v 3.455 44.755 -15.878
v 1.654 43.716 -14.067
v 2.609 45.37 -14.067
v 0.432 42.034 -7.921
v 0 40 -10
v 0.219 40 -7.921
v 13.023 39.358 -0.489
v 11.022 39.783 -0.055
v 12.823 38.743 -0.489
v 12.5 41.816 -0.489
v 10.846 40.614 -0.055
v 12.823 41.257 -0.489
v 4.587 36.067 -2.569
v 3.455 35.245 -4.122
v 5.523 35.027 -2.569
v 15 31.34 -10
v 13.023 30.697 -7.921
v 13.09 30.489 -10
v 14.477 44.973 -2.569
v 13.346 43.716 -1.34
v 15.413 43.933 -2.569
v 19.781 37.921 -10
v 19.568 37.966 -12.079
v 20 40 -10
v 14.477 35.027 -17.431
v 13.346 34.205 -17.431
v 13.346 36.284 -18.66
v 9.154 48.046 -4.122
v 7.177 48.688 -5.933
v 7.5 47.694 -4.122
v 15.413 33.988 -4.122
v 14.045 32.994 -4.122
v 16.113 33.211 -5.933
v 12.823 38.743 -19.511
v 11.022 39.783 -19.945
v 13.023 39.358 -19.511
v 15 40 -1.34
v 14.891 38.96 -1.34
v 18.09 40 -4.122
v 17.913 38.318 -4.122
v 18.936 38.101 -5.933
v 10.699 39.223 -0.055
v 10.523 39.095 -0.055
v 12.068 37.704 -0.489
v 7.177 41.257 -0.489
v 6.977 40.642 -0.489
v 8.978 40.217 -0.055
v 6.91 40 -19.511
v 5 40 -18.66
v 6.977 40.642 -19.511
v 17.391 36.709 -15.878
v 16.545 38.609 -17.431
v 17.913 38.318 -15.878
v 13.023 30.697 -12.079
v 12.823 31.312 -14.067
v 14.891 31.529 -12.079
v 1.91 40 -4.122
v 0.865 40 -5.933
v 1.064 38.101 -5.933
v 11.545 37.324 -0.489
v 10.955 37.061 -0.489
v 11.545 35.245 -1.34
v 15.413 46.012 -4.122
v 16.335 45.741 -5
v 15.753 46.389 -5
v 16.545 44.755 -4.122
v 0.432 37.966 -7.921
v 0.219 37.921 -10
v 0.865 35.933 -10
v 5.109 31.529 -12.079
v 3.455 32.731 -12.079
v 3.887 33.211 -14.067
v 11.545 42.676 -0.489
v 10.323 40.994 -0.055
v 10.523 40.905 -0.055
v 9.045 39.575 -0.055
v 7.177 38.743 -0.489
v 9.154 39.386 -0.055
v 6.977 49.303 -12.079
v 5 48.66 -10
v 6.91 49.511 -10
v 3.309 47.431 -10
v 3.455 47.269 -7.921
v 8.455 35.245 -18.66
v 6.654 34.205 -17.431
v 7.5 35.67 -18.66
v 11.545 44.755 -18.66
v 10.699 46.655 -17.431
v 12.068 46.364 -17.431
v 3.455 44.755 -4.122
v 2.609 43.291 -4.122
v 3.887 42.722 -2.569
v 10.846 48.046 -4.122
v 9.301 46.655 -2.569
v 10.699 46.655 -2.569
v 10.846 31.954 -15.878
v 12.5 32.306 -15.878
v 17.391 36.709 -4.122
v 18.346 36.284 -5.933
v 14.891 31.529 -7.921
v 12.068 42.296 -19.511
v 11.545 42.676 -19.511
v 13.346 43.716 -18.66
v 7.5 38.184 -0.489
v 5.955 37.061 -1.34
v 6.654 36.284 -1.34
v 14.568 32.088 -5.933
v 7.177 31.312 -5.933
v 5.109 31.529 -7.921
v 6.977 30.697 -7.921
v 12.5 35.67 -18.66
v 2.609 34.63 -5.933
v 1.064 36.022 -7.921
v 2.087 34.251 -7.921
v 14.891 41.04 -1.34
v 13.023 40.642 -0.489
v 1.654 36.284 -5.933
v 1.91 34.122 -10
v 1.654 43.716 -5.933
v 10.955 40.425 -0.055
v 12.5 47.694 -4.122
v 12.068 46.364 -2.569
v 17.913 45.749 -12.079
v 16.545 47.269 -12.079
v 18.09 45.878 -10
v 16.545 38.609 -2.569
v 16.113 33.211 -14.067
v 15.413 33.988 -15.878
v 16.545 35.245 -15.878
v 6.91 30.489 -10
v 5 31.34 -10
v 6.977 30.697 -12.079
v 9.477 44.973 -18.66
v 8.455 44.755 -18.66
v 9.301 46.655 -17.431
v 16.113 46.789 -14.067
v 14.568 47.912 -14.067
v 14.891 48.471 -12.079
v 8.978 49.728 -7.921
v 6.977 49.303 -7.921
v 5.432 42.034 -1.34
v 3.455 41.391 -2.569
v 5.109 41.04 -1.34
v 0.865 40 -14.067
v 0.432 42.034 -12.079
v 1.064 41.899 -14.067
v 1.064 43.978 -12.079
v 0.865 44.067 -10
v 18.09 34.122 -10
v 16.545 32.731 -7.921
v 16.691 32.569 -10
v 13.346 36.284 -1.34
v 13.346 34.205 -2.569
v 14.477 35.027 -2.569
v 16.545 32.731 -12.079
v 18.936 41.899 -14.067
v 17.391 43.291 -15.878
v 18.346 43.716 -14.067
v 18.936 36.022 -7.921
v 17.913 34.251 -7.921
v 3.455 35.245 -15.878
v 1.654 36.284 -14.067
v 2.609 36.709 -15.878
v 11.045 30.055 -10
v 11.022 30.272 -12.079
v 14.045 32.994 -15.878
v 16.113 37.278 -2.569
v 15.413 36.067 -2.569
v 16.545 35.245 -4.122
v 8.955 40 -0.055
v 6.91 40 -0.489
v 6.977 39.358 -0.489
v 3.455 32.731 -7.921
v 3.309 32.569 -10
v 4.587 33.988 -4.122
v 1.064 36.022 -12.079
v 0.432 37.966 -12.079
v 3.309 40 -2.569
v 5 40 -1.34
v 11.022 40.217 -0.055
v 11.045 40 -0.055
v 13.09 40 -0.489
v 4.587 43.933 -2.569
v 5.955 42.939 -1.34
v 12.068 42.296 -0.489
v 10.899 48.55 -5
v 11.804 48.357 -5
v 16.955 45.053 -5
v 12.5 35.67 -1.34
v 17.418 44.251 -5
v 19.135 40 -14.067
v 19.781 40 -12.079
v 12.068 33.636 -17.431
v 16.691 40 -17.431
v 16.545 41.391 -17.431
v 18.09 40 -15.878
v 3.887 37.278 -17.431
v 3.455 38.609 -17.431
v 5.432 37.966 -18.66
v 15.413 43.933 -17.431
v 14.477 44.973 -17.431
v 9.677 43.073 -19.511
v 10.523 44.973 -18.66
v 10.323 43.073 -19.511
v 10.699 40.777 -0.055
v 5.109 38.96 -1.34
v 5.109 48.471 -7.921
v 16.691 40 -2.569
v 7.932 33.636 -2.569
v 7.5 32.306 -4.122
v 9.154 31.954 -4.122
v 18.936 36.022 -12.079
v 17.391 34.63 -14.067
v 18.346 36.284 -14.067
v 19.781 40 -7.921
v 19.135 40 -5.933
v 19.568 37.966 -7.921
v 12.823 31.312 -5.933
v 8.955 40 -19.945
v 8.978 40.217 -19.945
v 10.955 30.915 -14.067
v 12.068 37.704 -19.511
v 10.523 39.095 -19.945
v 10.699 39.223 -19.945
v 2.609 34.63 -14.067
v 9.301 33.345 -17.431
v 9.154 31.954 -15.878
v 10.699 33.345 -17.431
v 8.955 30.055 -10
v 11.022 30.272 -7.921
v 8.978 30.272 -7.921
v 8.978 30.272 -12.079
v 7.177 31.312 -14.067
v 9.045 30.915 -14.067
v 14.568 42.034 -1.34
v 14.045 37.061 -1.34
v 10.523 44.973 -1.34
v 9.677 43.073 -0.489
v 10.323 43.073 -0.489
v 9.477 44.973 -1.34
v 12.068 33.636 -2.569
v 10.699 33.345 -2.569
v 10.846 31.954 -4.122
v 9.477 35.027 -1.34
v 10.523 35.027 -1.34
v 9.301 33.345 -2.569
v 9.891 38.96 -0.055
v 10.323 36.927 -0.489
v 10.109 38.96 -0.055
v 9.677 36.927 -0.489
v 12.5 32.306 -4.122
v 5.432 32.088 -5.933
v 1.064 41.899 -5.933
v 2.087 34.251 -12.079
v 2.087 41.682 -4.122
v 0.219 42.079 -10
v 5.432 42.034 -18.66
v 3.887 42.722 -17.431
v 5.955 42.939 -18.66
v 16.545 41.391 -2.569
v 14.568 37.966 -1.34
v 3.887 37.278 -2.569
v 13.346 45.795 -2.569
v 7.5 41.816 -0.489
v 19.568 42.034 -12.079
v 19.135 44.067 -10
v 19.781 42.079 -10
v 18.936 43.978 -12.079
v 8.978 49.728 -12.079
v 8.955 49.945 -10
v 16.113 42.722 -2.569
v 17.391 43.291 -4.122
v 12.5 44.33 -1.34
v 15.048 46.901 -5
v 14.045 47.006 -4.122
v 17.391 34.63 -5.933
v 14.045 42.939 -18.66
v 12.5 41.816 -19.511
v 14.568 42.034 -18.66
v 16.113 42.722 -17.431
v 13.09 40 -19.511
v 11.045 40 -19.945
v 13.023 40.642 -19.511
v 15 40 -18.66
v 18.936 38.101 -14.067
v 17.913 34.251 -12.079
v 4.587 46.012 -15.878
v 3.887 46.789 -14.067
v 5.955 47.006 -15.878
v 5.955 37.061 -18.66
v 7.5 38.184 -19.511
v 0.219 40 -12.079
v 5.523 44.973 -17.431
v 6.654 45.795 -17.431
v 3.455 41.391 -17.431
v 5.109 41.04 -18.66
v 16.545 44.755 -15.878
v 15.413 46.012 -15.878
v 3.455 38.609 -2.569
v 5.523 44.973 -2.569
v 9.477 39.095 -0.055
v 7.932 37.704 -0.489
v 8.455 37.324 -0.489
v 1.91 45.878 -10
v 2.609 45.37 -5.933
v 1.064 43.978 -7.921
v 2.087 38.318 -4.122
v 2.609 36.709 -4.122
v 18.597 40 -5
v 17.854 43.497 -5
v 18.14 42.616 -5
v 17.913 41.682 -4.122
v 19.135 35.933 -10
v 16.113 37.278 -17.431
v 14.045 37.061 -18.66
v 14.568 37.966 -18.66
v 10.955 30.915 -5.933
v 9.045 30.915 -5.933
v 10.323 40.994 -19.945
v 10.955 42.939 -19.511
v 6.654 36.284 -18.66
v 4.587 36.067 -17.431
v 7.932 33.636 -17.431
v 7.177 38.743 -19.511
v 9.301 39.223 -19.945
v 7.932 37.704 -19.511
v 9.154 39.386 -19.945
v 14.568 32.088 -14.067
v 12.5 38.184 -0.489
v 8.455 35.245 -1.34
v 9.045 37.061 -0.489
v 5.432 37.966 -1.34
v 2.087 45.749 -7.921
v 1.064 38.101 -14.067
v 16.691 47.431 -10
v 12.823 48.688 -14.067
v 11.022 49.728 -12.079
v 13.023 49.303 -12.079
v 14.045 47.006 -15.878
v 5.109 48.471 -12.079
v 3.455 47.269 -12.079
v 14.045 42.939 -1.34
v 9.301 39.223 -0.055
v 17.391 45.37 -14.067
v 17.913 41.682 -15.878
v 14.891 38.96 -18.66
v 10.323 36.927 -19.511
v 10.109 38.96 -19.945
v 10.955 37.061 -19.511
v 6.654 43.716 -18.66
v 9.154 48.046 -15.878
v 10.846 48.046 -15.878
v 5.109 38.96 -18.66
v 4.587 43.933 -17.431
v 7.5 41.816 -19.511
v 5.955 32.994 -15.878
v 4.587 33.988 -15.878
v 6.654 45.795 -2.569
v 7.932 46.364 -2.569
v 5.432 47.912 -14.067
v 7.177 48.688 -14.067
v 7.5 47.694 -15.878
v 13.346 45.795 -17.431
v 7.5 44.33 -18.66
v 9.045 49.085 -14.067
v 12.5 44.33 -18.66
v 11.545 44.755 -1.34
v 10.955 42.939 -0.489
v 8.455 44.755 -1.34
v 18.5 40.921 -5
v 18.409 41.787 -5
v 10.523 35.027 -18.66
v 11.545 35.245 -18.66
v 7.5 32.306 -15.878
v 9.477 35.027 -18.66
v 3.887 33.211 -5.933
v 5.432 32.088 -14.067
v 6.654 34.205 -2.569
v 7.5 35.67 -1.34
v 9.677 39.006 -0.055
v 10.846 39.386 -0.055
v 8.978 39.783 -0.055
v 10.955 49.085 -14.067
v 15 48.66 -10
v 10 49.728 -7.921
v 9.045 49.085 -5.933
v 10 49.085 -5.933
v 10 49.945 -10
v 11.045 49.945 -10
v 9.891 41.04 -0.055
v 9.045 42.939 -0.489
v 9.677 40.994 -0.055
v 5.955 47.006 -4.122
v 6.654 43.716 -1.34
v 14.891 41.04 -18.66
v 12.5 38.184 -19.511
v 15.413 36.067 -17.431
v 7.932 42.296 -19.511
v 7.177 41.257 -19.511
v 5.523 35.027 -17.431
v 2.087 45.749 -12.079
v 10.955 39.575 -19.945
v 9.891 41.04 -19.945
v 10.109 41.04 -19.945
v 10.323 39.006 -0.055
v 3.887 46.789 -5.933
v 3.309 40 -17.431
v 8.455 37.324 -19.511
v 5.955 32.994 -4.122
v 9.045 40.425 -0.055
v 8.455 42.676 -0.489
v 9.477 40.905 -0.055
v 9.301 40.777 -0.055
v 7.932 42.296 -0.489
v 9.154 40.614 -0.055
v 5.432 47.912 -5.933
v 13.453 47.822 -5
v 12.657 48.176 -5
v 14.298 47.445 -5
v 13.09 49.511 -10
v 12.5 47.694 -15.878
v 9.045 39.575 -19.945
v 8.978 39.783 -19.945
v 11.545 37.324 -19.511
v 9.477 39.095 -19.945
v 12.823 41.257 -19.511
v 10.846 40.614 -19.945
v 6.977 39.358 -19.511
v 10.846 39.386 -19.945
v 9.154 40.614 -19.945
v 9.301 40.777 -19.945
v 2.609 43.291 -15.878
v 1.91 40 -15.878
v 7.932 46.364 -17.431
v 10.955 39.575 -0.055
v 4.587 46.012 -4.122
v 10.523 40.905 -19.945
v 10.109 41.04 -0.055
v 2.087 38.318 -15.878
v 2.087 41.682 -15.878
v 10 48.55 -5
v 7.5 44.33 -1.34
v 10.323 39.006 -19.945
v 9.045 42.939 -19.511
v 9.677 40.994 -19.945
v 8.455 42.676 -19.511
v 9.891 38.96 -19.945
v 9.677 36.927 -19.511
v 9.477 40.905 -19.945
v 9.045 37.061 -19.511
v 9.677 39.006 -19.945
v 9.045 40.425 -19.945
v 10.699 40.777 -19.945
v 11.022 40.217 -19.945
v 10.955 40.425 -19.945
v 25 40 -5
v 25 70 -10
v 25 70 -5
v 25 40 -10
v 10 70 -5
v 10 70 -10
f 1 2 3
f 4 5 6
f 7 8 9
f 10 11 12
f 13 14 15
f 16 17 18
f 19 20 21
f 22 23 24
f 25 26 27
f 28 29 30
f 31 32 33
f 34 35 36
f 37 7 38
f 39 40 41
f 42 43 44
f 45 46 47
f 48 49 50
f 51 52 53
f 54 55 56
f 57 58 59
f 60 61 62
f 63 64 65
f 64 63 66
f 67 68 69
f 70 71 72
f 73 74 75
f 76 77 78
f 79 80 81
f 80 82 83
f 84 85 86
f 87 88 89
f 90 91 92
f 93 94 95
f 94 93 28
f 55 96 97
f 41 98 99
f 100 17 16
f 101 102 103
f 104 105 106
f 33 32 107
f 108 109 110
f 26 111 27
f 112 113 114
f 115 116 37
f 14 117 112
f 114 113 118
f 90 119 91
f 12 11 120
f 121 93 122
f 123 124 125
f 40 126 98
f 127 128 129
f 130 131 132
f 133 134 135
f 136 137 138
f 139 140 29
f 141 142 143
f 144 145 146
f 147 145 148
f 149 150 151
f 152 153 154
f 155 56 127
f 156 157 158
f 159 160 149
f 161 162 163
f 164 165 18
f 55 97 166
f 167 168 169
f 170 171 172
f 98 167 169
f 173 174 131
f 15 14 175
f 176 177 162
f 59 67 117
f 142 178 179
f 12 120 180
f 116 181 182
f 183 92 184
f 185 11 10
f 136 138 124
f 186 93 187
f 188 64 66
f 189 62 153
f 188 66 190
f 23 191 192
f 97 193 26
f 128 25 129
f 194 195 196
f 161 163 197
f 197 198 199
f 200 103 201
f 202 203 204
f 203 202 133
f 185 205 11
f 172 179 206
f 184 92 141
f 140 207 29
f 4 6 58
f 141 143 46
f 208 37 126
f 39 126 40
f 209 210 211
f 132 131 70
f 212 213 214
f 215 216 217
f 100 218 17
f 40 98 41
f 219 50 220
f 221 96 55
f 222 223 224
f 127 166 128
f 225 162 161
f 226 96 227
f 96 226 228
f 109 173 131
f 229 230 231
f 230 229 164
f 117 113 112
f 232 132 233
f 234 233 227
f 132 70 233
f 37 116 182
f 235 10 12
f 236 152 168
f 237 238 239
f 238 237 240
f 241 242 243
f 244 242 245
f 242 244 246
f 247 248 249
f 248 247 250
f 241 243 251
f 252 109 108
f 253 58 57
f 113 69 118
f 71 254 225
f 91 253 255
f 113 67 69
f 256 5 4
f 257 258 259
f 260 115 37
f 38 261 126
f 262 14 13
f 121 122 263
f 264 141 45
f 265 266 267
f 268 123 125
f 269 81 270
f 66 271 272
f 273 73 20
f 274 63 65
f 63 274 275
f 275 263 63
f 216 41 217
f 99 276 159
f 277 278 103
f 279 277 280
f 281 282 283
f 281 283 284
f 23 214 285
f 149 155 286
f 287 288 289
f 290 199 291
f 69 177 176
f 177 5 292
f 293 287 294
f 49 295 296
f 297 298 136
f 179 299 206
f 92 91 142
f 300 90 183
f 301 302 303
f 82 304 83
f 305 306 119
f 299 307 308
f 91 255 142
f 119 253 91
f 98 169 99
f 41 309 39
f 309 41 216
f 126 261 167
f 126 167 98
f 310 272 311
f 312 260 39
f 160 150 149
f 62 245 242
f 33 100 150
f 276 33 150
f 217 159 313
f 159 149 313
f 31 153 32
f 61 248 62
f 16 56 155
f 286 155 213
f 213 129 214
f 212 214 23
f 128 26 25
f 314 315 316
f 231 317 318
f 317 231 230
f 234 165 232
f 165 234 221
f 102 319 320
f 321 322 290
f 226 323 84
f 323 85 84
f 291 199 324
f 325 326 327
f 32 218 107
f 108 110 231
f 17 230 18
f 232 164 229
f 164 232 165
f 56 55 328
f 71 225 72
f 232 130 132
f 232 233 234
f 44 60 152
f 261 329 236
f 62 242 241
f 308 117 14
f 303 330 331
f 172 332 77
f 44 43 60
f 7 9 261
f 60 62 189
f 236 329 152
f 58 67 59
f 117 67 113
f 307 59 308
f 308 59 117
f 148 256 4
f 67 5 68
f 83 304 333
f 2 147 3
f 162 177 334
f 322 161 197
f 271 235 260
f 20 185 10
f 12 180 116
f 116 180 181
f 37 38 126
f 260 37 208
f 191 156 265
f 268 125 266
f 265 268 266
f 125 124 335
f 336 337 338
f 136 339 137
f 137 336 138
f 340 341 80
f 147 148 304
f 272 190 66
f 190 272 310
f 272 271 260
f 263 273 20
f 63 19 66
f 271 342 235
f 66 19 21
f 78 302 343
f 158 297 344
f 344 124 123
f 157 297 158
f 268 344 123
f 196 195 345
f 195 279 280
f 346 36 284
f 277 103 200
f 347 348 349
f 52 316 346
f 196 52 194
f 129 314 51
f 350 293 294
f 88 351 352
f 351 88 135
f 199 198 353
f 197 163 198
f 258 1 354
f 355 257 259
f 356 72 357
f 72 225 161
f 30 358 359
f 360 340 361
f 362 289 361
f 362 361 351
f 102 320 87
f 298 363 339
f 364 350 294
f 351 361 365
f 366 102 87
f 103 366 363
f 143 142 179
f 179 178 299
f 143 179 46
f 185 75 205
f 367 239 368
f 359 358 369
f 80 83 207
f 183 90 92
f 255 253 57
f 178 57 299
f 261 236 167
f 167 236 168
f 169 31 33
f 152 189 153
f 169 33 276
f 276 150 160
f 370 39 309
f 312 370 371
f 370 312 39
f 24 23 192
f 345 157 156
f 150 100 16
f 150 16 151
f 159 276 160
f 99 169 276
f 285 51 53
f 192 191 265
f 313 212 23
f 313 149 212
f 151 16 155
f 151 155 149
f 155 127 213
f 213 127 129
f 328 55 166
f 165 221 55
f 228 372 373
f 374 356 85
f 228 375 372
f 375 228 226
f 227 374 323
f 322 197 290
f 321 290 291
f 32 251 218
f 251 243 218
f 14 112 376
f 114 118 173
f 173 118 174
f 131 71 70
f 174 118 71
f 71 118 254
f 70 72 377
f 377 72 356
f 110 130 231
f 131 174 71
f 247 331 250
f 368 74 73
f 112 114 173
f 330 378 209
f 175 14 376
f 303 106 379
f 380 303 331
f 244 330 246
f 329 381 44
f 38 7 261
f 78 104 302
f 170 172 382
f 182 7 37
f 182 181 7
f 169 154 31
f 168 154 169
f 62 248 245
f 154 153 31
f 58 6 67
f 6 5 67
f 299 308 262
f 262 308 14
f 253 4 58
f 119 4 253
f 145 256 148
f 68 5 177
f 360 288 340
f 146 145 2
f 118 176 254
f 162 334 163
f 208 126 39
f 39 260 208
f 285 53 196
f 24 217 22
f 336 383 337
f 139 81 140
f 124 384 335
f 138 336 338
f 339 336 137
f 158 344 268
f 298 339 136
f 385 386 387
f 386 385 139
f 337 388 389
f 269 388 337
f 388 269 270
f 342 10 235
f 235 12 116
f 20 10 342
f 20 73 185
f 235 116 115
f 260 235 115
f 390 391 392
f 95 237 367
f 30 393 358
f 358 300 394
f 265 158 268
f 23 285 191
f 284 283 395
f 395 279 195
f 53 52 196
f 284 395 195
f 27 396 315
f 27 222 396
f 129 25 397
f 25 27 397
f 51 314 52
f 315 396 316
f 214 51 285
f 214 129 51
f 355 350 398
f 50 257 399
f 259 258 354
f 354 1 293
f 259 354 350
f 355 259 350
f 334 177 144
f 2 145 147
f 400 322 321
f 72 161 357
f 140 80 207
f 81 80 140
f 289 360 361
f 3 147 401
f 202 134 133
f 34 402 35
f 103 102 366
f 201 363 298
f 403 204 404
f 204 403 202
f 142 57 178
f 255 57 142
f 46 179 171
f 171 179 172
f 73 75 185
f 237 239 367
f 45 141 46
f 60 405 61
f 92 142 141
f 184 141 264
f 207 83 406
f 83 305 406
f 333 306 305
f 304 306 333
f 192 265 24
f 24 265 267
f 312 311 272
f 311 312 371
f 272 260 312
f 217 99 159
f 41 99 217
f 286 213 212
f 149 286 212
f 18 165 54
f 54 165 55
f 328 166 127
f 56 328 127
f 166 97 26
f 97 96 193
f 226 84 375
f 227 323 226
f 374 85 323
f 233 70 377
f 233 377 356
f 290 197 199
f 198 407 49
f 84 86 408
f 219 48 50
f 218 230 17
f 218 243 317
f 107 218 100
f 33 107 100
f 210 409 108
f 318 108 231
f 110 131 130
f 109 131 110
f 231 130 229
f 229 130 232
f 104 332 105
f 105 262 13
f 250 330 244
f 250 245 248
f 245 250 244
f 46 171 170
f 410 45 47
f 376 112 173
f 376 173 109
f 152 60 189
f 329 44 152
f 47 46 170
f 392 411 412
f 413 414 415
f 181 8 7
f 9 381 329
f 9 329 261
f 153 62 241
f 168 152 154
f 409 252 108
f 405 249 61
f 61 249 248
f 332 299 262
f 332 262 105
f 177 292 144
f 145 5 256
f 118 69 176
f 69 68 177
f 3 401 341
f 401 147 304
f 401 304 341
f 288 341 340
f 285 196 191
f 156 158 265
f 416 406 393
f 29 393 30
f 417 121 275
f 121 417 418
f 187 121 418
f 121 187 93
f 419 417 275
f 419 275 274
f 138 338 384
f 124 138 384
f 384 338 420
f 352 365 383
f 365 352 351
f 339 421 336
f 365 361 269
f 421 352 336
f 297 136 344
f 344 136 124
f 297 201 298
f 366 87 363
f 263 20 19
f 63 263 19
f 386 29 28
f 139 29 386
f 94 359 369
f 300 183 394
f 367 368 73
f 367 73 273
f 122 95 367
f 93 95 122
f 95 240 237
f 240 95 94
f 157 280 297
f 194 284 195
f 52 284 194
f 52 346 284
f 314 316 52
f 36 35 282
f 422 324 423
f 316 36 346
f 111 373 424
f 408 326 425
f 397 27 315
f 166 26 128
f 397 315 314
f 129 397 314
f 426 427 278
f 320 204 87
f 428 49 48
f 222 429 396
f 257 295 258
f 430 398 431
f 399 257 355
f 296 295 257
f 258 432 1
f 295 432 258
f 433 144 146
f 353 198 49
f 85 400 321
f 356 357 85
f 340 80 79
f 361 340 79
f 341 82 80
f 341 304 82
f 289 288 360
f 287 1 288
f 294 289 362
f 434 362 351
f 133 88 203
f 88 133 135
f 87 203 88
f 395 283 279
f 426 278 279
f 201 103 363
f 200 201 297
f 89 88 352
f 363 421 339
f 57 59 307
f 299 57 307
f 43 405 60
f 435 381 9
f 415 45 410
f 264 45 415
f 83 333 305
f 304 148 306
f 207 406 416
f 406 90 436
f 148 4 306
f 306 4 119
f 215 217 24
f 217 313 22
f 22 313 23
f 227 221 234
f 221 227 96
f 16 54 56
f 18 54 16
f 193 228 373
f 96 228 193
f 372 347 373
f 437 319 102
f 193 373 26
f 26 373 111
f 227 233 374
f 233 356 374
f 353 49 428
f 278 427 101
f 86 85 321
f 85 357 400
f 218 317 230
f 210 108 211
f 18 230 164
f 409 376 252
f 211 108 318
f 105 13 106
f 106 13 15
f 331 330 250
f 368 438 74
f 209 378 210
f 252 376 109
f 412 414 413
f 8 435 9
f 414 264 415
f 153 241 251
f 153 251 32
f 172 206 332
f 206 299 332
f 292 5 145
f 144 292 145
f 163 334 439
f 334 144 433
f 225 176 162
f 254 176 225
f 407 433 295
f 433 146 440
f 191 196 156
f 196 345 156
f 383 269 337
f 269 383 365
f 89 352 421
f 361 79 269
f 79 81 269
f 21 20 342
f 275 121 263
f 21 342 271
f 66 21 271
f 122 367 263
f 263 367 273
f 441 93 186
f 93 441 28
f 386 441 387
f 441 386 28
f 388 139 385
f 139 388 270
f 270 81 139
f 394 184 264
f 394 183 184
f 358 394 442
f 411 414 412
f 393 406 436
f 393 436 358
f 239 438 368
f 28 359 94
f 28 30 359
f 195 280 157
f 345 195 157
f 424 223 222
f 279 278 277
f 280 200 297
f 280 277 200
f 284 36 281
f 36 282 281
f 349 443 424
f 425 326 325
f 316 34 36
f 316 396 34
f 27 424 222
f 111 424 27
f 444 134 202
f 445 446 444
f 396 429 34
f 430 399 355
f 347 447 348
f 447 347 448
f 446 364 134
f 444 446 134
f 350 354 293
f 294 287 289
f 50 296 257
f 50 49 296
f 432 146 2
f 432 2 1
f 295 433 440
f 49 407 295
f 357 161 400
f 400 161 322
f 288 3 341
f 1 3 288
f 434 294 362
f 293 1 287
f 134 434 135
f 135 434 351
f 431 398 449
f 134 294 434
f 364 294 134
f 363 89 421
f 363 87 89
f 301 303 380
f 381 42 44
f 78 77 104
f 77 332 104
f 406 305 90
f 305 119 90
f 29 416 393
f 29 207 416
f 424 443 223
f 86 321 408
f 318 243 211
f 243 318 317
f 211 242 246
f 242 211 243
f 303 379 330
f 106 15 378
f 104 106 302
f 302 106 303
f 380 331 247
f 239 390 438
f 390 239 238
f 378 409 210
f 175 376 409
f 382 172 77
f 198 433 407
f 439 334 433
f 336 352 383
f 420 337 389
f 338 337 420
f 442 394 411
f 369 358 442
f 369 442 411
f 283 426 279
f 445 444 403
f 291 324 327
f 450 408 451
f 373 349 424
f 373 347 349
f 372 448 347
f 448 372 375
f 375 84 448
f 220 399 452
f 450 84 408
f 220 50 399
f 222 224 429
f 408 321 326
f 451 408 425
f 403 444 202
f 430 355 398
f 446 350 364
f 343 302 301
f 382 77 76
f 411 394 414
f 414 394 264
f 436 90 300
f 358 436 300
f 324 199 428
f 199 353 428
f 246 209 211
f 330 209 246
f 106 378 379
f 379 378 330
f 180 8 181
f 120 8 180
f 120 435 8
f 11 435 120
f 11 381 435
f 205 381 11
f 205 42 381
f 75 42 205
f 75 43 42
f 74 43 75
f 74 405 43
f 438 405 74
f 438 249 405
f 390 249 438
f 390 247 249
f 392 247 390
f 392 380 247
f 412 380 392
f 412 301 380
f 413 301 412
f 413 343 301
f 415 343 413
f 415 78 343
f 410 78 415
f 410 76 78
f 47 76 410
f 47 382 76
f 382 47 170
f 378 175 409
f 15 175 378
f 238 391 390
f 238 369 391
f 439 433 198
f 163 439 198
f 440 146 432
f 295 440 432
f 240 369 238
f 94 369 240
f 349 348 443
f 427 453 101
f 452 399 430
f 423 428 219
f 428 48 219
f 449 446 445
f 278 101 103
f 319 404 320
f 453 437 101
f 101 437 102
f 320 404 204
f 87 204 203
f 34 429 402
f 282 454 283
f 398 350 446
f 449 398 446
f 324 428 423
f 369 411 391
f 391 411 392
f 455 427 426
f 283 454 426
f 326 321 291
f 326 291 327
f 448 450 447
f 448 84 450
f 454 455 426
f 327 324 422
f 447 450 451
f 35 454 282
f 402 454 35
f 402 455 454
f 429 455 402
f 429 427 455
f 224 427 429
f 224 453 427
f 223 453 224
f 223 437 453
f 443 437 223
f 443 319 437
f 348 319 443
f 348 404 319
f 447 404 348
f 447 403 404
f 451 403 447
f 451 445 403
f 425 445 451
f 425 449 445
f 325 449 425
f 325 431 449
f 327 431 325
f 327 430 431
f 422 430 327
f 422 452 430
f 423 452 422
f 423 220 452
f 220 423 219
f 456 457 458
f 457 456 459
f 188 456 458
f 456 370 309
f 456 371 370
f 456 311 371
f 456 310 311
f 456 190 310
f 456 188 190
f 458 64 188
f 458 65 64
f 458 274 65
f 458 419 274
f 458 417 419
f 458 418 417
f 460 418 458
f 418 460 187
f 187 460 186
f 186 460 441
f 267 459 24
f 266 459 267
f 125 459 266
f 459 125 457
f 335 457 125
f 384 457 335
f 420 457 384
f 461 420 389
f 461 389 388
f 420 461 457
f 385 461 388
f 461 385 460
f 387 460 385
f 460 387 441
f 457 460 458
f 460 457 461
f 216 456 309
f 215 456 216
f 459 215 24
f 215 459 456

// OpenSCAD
// Generated by generate_scads.py
translate([20,20,-30]) {
  translate([-10,20,20]) {
    union() {
      sphere(r=10);
      cube(size=[15,30,5], center=false);
    }
  }
}
